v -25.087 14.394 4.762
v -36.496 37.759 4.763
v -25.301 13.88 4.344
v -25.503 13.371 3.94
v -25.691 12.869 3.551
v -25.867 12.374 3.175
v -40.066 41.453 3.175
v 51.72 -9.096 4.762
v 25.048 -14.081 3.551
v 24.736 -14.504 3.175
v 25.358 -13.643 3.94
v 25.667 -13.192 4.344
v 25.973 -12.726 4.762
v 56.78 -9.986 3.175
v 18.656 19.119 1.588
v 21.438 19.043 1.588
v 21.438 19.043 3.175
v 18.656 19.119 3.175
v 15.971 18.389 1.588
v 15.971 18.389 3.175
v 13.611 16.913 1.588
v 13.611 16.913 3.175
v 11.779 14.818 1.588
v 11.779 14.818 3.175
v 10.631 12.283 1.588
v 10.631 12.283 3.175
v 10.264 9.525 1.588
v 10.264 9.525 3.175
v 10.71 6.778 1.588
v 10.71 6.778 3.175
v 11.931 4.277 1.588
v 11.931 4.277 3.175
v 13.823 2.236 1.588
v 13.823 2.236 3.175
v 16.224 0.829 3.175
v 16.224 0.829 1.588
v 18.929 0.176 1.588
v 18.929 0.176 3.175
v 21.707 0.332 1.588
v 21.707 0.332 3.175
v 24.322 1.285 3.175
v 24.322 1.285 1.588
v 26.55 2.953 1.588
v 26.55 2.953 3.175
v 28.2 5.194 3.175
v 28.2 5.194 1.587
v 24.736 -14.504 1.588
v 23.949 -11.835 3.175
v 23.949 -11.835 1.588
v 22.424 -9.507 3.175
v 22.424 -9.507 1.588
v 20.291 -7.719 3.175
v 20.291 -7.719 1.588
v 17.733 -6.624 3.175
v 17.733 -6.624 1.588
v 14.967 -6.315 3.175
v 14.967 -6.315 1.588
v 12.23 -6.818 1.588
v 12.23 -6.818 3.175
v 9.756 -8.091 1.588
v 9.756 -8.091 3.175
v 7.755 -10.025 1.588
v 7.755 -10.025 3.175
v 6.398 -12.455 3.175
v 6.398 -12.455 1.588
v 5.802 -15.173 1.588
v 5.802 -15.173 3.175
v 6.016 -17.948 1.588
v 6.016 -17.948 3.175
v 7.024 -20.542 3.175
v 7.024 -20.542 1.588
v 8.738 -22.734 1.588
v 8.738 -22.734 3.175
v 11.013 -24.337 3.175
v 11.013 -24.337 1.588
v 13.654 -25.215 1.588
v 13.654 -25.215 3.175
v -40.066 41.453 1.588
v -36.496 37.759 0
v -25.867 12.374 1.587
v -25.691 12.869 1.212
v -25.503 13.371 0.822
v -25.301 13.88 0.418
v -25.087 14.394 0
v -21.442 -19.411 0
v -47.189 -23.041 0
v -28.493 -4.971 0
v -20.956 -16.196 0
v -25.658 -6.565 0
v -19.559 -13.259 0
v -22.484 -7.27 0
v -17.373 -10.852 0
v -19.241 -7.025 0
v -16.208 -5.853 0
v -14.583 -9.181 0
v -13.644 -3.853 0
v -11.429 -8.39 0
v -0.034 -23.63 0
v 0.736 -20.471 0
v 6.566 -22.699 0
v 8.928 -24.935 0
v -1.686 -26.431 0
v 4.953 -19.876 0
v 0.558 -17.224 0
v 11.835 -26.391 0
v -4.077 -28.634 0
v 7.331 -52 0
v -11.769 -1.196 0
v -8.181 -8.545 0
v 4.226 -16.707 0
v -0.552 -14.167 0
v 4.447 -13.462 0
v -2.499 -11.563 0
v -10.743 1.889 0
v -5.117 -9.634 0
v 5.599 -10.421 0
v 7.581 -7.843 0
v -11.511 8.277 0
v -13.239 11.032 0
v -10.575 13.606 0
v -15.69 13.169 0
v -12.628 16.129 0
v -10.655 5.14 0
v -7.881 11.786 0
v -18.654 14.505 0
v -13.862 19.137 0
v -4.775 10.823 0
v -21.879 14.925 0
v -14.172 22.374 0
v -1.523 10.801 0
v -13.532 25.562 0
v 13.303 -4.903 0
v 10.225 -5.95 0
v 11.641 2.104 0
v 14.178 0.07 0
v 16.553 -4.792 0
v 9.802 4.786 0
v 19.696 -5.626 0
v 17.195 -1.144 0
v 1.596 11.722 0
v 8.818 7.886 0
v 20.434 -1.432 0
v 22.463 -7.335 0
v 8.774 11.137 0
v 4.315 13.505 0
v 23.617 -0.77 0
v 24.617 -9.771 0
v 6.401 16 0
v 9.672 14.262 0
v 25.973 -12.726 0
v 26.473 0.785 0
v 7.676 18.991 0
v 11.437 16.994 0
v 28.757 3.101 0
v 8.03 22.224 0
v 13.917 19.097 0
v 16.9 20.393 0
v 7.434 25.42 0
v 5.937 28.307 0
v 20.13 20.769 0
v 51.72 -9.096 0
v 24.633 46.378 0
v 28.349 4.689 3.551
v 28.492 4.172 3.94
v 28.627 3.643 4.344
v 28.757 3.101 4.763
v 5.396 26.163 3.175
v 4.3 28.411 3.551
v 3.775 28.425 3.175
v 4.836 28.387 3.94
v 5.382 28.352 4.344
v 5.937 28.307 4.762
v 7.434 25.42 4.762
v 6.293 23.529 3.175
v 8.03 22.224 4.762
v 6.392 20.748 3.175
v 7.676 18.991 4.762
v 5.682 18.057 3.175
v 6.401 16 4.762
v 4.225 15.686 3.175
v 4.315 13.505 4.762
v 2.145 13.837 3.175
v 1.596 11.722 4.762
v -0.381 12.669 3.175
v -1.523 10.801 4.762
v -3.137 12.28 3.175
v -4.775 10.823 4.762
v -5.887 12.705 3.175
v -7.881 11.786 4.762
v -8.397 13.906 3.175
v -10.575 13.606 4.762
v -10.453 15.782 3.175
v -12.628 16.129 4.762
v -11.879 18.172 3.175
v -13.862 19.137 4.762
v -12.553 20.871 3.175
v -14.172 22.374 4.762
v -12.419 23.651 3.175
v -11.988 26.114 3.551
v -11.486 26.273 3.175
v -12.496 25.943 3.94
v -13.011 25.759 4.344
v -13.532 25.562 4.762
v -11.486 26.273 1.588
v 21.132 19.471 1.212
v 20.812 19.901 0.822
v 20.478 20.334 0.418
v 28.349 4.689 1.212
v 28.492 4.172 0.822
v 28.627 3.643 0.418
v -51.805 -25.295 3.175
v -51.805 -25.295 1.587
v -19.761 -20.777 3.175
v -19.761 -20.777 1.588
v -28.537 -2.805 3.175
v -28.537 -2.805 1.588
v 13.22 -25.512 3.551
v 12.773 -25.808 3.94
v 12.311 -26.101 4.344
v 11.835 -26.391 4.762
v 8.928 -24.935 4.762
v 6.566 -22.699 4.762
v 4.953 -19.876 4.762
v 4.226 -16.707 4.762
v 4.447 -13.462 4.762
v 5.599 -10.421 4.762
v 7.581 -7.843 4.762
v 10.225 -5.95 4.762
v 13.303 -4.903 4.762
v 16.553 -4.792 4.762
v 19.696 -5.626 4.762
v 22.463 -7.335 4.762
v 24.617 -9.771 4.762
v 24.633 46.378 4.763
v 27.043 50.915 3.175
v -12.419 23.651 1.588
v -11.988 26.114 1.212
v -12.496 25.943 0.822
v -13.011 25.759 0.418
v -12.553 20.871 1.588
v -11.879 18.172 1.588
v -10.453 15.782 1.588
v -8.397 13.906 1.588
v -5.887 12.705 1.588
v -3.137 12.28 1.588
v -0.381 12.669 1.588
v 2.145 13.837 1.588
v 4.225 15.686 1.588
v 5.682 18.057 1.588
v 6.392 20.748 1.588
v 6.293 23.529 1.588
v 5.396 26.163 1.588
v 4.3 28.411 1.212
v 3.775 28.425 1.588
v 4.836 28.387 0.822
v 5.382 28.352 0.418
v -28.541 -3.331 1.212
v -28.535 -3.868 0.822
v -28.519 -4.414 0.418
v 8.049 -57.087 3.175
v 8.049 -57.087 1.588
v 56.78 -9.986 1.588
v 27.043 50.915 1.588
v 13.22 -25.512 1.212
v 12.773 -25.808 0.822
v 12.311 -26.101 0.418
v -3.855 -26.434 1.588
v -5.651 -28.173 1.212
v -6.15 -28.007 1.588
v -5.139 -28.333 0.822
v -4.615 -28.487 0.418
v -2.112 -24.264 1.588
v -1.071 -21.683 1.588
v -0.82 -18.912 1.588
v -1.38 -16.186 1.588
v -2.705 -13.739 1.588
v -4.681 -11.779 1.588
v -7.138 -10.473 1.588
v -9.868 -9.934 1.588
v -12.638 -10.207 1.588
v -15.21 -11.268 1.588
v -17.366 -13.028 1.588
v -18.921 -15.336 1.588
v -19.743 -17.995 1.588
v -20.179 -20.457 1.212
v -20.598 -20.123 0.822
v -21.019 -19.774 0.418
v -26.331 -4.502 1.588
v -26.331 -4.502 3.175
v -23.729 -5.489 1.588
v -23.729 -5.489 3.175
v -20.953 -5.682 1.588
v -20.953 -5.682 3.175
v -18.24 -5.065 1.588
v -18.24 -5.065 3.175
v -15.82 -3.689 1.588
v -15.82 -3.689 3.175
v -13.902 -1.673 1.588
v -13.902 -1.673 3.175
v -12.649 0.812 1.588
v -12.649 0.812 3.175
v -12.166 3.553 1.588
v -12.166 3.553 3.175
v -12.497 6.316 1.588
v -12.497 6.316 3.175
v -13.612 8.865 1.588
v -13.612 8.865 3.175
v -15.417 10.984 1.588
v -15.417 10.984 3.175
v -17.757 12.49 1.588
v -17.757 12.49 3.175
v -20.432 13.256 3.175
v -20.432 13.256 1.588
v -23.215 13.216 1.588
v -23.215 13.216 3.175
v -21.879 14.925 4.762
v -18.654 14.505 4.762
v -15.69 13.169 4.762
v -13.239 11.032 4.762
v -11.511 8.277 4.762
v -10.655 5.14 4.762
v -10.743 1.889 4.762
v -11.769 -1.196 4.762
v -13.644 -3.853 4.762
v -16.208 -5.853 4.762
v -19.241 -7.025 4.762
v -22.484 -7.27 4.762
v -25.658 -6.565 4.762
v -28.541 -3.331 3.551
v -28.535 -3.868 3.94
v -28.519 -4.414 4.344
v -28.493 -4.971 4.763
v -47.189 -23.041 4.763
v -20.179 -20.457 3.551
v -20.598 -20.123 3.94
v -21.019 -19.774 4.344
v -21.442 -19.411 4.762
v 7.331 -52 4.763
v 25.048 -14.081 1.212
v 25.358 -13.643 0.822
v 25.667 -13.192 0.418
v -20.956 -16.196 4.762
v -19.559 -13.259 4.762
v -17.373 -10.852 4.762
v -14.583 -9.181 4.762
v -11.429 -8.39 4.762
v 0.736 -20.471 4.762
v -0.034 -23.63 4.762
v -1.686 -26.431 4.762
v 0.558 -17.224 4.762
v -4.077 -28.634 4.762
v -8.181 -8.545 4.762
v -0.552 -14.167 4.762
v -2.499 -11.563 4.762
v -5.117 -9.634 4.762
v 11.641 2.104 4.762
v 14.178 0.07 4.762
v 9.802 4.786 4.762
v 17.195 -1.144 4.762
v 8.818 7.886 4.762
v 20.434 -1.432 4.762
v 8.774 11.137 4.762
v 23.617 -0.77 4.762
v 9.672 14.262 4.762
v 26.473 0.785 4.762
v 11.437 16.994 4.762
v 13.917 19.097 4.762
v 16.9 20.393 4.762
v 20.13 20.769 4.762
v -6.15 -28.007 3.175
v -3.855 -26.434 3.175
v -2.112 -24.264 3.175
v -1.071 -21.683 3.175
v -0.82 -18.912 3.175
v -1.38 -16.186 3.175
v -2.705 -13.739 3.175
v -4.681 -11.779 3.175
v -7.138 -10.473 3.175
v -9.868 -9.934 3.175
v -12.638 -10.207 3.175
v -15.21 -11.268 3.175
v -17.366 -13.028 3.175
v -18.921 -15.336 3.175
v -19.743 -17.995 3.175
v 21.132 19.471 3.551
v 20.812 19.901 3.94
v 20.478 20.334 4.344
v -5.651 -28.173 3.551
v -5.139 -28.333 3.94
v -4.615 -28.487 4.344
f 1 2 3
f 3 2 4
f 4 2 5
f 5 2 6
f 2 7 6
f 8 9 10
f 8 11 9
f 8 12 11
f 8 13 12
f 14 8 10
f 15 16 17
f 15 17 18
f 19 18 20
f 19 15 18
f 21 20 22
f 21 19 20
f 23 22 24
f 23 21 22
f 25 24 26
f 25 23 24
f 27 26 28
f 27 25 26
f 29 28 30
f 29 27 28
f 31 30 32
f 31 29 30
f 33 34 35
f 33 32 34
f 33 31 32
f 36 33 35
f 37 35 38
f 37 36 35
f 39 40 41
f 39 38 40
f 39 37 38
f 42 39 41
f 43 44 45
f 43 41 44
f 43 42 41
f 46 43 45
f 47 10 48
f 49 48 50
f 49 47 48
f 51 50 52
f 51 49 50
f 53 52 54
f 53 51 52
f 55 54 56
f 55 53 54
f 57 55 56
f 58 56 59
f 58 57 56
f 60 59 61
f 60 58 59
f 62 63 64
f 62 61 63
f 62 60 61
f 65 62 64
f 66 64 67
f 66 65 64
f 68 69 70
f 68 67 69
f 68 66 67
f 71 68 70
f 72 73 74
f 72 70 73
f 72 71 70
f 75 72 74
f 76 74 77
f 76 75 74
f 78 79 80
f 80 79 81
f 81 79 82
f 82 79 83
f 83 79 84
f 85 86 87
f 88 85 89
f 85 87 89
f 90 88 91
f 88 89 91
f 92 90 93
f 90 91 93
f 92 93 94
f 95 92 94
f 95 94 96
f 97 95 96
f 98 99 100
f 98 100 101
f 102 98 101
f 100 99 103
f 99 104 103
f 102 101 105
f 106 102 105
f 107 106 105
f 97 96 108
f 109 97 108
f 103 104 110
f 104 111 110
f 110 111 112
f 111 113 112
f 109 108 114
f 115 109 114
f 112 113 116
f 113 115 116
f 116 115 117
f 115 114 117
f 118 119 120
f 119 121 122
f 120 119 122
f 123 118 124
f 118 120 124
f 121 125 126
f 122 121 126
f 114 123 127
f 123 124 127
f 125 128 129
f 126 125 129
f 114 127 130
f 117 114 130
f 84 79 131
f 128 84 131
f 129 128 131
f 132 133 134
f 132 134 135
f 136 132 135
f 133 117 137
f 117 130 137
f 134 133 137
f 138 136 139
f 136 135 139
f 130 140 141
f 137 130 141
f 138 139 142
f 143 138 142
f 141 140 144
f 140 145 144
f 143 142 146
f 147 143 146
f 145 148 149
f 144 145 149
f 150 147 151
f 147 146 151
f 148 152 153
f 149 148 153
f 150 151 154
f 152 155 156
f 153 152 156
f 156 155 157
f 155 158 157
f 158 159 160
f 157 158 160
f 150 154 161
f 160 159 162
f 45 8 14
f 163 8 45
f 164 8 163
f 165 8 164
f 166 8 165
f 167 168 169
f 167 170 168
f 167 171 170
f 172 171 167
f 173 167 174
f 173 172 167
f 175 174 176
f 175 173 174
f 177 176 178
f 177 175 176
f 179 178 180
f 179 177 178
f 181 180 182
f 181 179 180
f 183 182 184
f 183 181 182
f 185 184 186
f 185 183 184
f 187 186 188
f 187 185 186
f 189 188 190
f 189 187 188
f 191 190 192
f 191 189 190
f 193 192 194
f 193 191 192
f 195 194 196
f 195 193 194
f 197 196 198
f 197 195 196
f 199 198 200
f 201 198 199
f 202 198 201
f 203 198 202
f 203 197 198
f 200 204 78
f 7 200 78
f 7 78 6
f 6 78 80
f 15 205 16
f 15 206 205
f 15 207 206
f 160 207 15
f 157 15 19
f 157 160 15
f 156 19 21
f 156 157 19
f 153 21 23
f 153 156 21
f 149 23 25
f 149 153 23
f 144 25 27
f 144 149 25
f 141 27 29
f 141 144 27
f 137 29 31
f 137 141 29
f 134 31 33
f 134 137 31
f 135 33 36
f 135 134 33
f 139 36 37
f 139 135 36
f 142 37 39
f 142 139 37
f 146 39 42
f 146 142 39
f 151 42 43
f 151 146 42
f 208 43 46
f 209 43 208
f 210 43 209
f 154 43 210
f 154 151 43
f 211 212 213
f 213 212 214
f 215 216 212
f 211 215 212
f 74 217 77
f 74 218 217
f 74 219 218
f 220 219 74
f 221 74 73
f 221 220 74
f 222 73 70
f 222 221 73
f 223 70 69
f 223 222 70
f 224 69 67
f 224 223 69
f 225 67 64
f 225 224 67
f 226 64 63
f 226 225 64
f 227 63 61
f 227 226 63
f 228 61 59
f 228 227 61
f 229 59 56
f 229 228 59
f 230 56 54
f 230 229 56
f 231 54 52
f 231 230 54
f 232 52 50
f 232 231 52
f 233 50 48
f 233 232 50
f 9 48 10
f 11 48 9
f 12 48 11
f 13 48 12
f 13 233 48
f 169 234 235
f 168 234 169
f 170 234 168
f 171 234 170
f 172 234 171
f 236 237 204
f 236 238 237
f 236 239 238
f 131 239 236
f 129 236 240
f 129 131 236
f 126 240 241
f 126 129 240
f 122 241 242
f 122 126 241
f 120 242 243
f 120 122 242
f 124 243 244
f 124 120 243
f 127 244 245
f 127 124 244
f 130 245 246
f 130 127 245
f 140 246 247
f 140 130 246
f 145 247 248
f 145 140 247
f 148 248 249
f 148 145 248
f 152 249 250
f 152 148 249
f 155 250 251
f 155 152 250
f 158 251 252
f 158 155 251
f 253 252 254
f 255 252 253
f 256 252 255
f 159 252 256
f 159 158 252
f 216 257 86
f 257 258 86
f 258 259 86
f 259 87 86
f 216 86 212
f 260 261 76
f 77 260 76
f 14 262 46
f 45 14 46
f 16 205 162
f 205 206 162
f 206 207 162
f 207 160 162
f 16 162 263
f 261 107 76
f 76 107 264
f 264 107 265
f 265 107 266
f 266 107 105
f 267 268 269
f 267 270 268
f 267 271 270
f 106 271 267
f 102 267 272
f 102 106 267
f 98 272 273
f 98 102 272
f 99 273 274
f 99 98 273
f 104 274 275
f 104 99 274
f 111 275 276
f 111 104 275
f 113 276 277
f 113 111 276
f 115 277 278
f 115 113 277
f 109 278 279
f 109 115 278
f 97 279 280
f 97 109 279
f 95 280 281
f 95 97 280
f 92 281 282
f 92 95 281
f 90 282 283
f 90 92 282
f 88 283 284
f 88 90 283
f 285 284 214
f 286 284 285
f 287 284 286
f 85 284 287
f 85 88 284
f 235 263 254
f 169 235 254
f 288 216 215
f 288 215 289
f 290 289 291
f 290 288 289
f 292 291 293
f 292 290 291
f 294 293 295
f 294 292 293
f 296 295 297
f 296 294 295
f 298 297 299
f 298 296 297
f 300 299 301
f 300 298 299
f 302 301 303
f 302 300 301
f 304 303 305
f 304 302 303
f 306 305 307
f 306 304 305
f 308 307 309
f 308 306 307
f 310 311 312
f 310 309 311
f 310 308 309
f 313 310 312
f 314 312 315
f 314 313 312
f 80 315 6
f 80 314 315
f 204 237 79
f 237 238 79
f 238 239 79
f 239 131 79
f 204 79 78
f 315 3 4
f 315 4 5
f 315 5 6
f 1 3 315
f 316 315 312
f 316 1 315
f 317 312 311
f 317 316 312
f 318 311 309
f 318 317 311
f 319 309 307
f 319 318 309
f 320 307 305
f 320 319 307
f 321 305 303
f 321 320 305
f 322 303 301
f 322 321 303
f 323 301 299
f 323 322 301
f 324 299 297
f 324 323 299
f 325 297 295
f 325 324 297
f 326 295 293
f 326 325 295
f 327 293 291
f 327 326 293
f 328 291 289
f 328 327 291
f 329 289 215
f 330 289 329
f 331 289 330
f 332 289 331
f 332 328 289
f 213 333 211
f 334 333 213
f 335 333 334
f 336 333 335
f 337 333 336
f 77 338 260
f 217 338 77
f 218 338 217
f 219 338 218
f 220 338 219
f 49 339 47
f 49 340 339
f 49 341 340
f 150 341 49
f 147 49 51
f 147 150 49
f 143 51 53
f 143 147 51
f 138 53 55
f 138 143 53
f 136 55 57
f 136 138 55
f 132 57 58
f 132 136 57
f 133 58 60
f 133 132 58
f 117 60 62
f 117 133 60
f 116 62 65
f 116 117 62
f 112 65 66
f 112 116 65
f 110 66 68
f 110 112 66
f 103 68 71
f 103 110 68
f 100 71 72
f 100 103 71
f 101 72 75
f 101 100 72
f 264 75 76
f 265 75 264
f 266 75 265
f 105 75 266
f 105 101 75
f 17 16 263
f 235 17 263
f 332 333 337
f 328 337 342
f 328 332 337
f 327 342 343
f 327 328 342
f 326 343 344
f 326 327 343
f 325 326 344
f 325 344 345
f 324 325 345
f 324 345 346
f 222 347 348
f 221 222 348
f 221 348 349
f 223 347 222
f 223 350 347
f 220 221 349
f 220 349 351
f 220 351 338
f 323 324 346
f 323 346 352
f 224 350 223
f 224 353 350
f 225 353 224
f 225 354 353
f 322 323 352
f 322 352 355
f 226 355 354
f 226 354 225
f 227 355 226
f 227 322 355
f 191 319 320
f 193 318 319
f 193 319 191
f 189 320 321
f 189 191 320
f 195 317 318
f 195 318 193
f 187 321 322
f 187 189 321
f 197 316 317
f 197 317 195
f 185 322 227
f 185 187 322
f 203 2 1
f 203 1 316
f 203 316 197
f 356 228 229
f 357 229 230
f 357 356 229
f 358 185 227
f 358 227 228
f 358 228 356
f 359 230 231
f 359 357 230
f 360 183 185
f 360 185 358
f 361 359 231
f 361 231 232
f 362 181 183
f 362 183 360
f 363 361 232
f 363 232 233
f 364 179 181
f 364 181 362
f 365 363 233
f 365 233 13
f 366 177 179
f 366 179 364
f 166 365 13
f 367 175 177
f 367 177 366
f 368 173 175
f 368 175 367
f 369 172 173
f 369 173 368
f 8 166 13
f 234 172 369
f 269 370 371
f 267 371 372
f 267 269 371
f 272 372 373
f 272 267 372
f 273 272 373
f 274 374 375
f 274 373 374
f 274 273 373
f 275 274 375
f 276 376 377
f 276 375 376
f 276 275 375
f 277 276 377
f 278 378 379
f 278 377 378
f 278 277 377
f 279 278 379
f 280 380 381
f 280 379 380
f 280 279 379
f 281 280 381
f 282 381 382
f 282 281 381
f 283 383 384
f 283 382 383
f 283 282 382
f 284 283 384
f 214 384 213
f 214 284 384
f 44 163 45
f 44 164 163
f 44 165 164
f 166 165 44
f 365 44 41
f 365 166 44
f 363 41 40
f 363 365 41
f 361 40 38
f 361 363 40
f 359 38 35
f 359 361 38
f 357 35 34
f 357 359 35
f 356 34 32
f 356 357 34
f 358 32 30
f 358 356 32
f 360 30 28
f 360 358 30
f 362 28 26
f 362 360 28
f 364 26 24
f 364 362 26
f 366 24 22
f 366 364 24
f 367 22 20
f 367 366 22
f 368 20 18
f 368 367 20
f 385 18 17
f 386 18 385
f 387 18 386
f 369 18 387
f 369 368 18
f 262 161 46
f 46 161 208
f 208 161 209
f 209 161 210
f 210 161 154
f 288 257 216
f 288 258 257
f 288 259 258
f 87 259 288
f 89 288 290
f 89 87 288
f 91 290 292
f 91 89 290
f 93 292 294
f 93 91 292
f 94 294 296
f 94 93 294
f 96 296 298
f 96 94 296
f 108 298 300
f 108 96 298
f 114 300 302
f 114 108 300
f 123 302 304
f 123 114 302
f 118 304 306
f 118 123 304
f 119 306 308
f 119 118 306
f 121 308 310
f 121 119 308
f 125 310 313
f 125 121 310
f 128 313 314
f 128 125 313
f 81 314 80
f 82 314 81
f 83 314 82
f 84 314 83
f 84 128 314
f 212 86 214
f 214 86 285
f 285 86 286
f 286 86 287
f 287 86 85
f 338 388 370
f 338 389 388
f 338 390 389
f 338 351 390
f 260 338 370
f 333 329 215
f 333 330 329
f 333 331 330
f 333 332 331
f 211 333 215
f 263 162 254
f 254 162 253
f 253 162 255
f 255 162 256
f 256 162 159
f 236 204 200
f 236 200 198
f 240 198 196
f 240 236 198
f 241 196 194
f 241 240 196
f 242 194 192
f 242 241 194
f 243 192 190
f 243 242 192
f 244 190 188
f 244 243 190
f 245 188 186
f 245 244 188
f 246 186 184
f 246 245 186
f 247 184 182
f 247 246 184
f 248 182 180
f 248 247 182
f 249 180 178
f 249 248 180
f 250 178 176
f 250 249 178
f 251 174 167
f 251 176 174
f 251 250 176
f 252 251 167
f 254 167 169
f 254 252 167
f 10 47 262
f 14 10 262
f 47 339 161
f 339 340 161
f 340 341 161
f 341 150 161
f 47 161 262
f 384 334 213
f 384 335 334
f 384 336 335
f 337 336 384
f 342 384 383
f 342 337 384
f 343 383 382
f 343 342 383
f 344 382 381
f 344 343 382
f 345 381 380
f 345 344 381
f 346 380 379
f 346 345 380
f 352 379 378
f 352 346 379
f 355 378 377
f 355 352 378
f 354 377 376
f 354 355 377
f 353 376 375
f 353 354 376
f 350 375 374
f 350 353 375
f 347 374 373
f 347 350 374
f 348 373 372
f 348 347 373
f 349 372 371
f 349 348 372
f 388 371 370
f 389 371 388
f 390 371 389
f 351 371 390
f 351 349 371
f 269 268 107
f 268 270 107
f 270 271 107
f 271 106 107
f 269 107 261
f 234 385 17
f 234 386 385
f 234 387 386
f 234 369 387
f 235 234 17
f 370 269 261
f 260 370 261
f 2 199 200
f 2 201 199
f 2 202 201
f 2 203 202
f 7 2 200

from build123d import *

# Parameters (mm, degrees)
F1_DEPTH = 4.7625
F2_R     = 9.525
F3_DEPTH = 4.7635
F4_SIZE  = 1.5875


# Not quite as in the source:
# - a feature of the source that left no trace in its solid (it failed there, or was rolled back) is left out


with BuildPart() as f1:
    # F0 (on Top) → F1 (new body)
    with BuildSketch(Plane.XY):
        Polygon((-3.074264621, 21.805118867), (-40.0660246394, 41.4531760826), (-21.6879004002, 3.8143528936), (-51.8053957451, -25.295317935), (-10.3295949709, -19.4477191337), (8.0485292683, -57.0865423226), (15.3038596181, -15.8337043219), (56.7796603923, -9.9861055206), (19.787900374, 9.6619516949), (27.0432307238, 50.9147896956), align=None)
    extrude(amount=F1_DEPTH)

    # F2 (on Top) → F3 (cut, through all)
    with BuildSketch(Plane.XY):
        with Locations((15.3038596181, -15.8337043219)):
            Circle(F2_R)
        with Locations((-10.3295949709, -19.4477191337)):
            Circle(F2_R)
        with Locations((-21.6879004002, 3.8143528936)):
            Circle(F2_R)
        with Locations((-3.074264621, 21.805118867)):
            Circle(F2_R)
        with Locations((19.787900374, 9.6619516949)):
            Circle(F2_R)
    extrude(amount=F3_DEPTH, mode=Mode.SUBTRACT)

    # F4
    f4_edges = [f1.edges().sort_by_distance(p)[0] for p in [
        (24.240507, 34.97888, 4.7625),
        (15.408887, 39.669767, 4.7625),
        (-1.744503, 12.373398, 4.7625),
        (-25.776163, 33.863161, 4.7625),
        (-32.966583, 26.913355, 4.7625),
        (-12.306882, 2.164469, 4.7625),
        (-40.171052, -14.050296, 4.7625),
        (-35.783356, -23.036399, 4.7625),
        (-5.861568, -11.035682, 4.7625),
        (0.949087, -42.546721, 4.7625),
        (10.851253, -41.150633, 4.7625),
        (8.684234, -8.984896, 4.7625),
        (40.75762, -12.245024, 4.7625),
        (42.489799, -2.39609, 4.7625),
        (11.22872, 5.482711, 4.7625),
        (24.240507, 34.97888, 0),
        (15.408887, 39.669767, 0),
        (-1.744503, 12.373398, 0),
        (-25.776163, 33.863161, 0),
        (-32.966583, 26.913355, 0),
        (-12.306882, 2.164469, 0),
        (-40.171052, -14.050296, 0),
        (-35.783356, -23.036399, 0),
        (-5.861568, -11.035682, 0),
        (0.949087, -42.546721, 0),
        (10.851253, -41.150633, 0),
        (8.684234, -8.984896, 0),
        (40.75762, -12.245024, 0),
        (42.489799, -2.39609, 0),
        (11.22872, 5.482711, 0),
    ]]
    chamfer(f4_edges, length=F4_SIZE)


solid = f1.part
